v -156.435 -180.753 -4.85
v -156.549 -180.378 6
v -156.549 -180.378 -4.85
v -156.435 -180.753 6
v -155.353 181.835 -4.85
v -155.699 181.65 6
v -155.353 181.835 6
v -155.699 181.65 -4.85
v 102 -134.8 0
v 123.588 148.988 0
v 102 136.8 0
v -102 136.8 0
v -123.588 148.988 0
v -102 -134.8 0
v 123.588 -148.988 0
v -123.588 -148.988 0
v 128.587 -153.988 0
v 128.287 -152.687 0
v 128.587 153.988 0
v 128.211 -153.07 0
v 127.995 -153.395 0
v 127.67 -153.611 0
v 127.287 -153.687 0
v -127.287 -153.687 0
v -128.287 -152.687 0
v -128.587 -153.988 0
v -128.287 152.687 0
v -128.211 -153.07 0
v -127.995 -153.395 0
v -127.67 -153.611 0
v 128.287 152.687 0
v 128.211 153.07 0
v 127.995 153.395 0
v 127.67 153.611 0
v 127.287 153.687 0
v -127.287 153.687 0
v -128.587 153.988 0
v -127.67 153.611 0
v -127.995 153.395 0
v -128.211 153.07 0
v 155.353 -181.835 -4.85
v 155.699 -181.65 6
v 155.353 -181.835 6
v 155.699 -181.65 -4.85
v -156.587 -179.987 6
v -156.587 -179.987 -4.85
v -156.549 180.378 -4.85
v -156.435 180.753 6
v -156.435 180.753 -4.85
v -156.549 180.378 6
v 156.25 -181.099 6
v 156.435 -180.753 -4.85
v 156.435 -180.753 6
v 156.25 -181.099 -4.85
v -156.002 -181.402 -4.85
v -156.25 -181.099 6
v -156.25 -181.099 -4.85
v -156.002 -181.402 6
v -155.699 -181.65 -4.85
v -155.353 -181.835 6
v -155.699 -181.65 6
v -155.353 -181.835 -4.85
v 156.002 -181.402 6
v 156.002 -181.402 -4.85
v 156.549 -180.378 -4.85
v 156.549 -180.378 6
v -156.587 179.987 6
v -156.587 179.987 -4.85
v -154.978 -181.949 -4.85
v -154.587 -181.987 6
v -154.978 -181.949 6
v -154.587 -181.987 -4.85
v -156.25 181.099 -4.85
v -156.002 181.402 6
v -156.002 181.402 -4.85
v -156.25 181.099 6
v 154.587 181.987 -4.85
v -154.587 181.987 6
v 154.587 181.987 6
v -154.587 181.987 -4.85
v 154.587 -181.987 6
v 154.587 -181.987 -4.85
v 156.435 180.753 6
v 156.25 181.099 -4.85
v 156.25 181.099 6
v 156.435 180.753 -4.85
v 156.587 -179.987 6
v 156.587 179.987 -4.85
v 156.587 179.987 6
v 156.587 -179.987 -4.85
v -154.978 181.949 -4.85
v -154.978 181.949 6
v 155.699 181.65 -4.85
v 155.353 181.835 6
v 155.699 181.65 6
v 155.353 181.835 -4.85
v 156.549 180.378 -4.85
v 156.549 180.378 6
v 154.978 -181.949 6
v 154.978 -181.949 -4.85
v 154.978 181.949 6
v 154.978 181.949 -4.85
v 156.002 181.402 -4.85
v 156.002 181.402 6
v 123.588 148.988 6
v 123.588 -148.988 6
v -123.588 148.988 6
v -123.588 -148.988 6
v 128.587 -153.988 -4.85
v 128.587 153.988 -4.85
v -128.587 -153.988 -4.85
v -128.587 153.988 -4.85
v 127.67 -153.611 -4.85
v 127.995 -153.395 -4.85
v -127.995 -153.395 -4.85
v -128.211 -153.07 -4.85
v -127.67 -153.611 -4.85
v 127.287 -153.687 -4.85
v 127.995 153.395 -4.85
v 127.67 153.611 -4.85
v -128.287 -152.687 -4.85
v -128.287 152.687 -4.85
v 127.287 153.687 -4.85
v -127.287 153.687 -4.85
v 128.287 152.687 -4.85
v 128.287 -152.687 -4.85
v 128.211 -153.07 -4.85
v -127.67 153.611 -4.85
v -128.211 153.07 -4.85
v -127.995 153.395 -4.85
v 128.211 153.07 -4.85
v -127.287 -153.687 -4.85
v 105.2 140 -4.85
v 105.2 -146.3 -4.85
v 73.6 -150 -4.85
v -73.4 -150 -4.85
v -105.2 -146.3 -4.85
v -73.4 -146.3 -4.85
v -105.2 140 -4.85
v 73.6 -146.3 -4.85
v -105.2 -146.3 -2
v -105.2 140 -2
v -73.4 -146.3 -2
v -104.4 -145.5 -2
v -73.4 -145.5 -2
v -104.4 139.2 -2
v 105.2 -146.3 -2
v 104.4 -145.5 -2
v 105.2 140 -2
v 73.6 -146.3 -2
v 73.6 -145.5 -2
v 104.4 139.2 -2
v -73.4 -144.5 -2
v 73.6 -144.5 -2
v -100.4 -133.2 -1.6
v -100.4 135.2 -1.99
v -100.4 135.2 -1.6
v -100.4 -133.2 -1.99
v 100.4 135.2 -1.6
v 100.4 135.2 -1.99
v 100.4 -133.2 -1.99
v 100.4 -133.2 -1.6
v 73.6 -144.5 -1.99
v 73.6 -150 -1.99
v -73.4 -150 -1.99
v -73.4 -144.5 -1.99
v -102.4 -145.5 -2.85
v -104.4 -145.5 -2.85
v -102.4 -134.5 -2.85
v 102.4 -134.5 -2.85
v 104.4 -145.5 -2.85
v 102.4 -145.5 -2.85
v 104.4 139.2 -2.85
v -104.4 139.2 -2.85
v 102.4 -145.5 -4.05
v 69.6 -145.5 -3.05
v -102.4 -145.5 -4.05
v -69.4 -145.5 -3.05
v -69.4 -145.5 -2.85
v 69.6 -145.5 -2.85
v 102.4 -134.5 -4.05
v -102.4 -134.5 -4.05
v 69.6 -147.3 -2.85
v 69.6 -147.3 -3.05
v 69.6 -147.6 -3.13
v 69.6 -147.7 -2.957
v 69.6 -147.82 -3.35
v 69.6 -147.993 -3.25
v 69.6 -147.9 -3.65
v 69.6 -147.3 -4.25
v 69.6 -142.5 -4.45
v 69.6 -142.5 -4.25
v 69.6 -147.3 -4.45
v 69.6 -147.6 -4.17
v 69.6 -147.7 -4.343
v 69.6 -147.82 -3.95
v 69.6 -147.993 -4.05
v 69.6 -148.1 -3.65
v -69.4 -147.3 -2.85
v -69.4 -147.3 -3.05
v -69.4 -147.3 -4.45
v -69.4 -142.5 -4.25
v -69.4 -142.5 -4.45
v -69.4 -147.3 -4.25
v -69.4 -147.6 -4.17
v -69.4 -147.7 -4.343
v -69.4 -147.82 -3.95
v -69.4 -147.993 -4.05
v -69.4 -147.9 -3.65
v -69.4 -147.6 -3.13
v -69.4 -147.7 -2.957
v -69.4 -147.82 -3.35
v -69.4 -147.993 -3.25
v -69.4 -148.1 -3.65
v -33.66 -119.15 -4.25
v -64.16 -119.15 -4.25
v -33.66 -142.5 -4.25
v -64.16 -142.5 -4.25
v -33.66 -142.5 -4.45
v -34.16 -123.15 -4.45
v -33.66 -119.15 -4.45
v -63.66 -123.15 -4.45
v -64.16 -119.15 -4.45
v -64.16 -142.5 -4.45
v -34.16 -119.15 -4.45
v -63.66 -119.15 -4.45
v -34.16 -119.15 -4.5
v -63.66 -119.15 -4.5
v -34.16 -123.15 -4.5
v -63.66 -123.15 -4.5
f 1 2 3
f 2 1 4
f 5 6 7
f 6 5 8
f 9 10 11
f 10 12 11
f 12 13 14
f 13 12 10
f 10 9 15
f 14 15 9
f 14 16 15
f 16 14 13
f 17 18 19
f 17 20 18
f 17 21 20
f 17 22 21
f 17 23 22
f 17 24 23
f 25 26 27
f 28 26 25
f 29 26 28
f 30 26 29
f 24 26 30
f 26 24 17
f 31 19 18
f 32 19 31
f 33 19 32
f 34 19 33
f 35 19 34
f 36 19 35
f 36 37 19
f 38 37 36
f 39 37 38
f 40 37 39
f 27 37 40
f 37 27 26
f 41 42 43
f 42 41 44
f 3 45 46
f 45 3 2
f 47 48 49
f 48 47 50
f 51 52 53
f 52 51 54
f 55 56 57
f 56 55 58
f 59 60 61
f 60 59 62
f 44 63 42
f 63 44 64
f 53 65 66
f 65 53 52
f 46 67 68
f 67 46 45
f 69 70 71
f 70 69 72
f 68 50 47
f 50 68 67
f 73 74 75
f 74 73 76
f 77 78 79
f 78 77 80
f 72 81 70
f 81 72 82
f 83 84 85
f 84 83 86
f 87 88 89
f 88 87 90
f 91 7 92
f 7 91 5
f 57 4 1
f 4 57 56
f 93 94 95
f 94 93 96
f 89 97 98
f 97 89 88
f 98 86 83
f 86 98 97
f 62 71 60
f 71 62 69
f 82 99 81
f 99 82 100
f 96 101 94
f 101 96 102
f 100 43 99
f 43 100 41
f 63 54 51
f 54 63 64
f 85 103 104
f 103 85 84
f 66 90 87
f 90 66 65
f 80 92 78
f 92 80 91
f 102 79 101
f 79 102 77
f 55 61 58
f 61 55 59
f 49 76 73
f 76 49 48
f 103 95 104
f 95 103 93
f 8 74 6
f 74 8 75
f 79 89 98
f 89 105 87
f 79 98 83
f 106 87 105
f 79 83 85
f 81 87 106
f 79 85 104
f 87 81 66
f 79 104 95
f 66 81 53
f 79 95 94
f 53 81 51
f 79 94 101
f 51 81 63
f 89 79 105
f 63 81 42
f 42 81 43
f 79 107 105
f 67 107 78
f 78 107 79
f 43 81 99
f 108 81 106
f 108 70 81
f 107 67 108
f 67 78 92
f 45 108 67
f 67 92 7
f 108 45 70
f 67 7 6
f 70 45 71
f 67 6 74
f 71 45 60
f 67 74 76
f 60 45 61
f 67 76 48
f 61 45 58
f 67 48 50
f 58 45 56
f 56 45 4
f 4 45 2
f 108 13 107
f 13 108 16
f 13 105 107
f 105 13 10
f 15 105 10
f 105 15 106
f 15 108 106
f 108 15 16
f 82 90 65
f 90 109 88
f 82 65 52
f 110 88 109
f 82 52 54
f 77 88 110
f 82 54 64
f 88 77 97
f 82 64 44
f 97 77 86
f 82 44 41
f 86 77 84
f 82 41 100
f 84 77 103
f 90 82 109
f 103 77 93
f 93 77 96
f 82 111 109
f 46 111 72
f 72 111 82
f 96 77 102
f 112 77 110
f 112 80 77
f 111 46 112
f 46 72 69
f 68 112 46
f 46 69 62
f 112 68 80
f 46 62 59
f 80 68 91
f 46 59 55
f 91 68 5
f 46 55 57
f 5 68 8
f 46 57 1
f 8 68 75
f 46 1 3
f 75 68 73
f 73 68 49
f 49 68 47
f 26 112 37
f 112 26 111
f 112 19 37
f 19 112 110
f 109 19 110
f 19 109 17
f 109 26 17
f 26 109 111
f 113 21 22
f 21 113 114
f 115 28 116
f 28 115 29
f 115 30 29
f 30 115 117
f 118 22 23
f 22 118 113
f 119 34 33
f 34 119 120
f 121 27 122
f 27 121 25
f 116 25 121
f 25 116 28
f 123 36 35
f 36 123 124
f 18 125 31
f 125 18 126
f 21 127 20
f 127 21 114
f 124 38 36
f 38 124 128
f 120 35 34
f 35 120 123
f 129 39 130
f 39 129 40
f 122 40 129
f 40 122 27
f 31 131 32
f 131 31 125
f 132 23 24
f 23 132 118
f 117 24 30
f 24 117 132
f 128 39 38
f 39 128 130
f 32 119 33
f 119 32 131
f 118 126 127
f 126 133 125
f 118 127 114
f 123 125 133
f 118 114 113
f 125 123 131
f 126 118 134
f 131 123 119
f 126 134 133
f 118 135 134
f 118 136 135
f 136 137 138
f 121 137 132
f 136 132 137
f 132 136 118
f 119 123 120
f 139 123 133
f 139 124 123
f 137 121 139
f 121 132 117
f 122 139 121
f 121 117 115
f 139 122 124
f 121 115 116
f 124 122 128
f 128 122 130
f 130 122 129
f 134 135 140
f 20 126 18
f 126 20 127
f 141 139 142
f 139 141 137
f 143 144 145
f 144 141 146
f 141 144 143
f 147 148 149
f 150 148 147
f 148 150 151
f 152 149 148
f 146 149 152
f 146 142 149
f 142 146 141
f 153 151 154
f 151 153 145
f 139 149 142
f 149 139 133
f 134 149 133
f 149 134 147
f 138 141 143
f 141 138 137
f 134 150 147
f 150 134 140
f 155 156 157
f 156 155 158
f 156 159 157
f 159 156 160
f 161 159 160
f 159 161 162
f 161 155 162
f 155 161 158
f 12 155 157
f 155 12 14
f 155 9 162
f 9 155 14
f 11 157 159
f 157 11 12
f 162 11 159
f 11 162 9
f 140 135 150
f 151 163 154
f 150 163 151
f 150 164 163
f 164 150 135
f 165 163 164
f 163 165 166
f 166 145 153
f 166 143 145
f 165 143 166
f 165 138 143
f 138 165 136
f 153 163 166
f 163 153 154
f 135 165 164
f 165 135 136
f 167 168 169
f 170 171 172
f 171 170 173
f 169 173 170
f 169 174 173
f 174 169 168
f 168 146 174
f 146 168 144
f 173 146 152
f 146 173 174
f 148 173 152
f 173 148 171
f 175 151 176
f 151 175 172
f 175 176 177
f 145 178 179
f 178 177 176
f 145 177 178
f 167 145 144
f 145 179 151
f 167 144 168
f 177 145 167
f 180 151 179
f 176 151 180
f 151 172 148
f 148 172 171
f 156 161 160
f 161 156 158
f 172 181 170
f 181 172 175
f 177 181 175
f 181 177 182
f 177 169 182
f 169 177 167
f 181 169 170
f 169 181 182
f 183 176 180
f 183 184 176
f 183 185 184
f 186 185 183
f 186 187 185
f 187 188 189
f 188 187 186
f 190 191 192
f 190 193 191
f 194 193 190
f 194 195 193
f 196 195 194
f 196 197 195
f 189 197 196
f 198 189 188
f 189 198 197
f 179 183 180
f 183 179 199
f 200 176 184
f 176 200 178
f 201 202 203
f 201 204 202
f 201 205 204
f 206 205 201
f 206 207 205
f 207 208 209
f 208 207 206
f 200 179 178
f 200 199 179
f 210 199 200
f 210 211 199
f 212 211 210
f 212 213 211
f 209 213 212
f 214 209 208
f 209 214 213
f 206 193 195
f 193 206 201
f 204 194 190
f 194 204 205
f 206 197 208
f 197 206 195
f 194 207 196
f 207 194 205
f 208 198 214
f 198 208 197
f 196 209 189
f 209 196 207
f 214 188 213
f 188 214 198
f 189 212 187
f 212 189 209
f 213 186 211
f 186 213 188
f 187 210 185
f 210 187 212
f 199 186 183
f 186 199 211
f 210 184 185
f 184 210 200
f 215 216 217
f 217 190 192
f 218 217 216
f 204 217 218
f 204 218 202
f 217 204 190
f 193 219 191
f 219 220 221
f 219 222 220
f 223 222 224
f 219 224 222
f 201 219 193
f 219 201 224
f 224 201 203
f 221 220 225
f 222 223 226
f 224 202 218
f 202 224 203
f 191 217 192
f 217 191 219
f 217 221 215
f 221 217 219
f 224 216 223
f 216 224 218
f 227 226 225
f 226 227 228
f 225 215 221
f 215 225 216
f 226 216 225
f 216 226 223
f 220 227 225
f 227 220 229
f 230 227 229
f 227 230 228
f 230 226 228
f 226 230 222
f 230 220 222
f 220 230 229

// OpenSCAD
// =====================================================================
// Picture-frame bezel spacer — Waveshare 13.3" Spectra 6 (E6) panel in a
// 12 1/16" x 10 1/16" rabbet, hung portrait, no glazing.
//
// What it is
// ----------
// A stepped ring that drops into the frame's rabbet in front of the panel:
//
//   front  ┌──────────────┐   face plate: the visible bezel, 45° mat-style
//          │  ┌────────┐  │   bevel on the window edge; overlaps the glass
//   wall ──┤  │ window │  │   so the panel cannot come forward.
//          │  └────────┘  │
//   back   └──────────────┘   pocket wall: fills the gap between the glass
//                              and the rabbet, so the panel cannot slide.
//
// The frame's own lip presses on the face plate; the frame's backing board
// presses everything forward. Nothing grabs the glass: every step of the
// load path is a push. See docs/plans/frame-bezel.md.
//
// The FPC leaves one SHORT edge of the glass (the 208.8 mm edge) in the
// plane of the glass, from its back surface, and must fold 180° behind the
// panel within ~3.4 mm of the glass edge (vendor drawing: "bending area
// R>0.5"). On that edge the pocket wall is simply absent from the back of the
// face plate through to the back of the spacer, outward past the glass by
// fpc_notch_out, over the whole width of the bonded flex.
//
// The rabbet depth was measured with printed coupons (part = "coupons"):
// 4.85 mm from the back of the lip to where the backing board sits. That is
// face + glass + 2.0 mm, and the 2.0 mm behind the glass is where the
// ribbon folds (R > 0.5 needs ~1.4) and where the 1.2 mm fan-out bump sits,
// so both live inside the spacer's depth. The backing board only needs a
// hole where the tail and the driver board are.
//
// Numbers come from the vendor drawing in the 13.3inch e-Paper (E) user
// manual, section 4:  OD 208.80 x 284.70 x 0.85, AA 202.80 x 270.40,
// AA is 3.00 from the glass on three edges and 11.30 on the FPC edge;
// the 60-pin tail is 30.5 wide, 29.75 long, its near edge 40.24 from the
// glass corner; the bonded flex runs ~40 to ~176 mm along that edge; the
// fan-out area on the back near that edge stands up to 1.2 mm proud.
//
//   part = "assembly"   frame + spacer + panel + FPC, viewed from the front
//        | "back"       spacer + panel + FPC only, meant to be viewed from behind
//        | "exploded"   frame, spacer, panel pulled apart along Z
//        | "section"    assembly cut through the FPC tail, half kept
//        | "profile"    a 1 mm slice through the tail, incl. backing board: the true section
//        | "calib"      a 200 mm square, for calibrating an orthographic render
//        | "ring"       the spacer alone, one piece, as installed
//        | "pieces"     the split spacer, face-down, laid out for printing
//        | "piece"      one piece (piece_id), face-down, for STL export
//        | "coupons"    test plate: corner samples at coupon_thicks, a joint pair, a notch slice
//        | "joint"      the dovetail pair alone, well separated, for a fit test
//        | "joints"     fit ladder: one tab half and a socket half per value in joint_fits
//        | "notch"      the ribbon-edge piece from behind with the glass ghosted: the notch area
//
// Frame coordinates: origin at the rabbet centre, X across, Y up, viewer
// at +Z. The spacer's front face is z = 0 and it extends to z = -thick.
// Print parts are mirrored so the front face lies on the bed.
// =====================================================================

/* [What to render] */
part     = "assembly";   // assembly | back | section | ring | pieces | piece
piece_id = 0;            // for part="piece": 0 top-left, 1 top-right, 2 bottom-left, 3 bottom-right (halves: 0 top, 1 bottom)

/* [Frame rabbet — measured, as hung] */
rabbet_w_in = 10.125;    // width of the rabbet opening, inches (first print at 10 1/16 sat 1/16 loose)
rabbet_h_in = 12.125;    // height, inches (same)
rabbet_fit  = 0.6;       // total clearance to the rabbet (0.3 per side)
rabbet_depth_in = 4.85 / 25.4;  // back of the lip to where the backing board sits: measured with coupons, 4.85 mm
outer_r     = 1.0;       // outer corner radius (routed rabbets are rarely dead sharp)
frame_lip   = 5.0;       // mock-up only: how far the moulding overhangs the rabbet
frame_face  = 28;        // mock-up only: moulding width

/* [Panel — vendor drawing] */
panel_w    = 208.8;      // glass, short axis
panel_h    = 284.7;      // glass, long axis (FPC on one end of this axis)
panel_t    = 0.85;
aa_w       = 202.8;
aa_h       = 270.4;
aa_off     = 3.0;        // glass edge to active area, three edges
aa_off_fpc = 11.3;       // glass edge to active area, FPC edge
panel_fit  = 1.6;        // total pocket clearance around the glass (0.8 a side; was 0.6 until the -0.05 joints closed the ring up)
bump_t     = 1.2;        // fan-out area stands this far off the BACK of the glass
bump_w     = 11.0;       // ... over this strip along the FPC edge (mock-up)
fpc_fold_t = 1.8;        // the folded flex stands this far off the back of the glass (mock-up)

/* [FPC — vendor drawing] */
fpc_side       = "bottom";  // bottom | top | left | right : which frame edge the ribbon edge of the glass sits on
fpc_mirror     = false;     // set true if the tail is nearest the OTHER corner of that edge than the mock-up shows
fpc_bond_from  = 35.0;      // bonded flex, along the FPC edge, from the tail-side glass corner (first print: flex flush at 40, so 5 mm more)
fpc_bond_to    = 174.0;     // (first print had ~5 mm spare here)
fpc_tail_from  = 40.24;     // tail near edge from the same corner
fpc_tail_w     = 30.5;
fpc_tail_len   = 29.75;     // beyond the glass edge before folding, i.e. behind the panel after
fpc_notch_out  = 4.5;       // notch reaches this far past the glass edge (bend zone is ~3.4)
fpc_notch_ext  = 4.0;       // notch runs this much past the bonded flex at each end
// The notch is the full wall: from the pocket floor (back of the face plate)
// through to the back of the spacer. The first print stopped it 0.25 mm short
// of the glass back and left a 0.6 mm sliver of wall standing between the
// pocket and the recess, which served nothing.

/* [Bezel] */
face_t         = 2.0;    // visible face plate thickness
image_hidden   = 1.0;    // image lost under the lip, per edge (lip = dead border + this)
bevel          = 1.6;    // 45° bevel on the window edge, measured into the face (< face_t)
pocket_clear_z = 0.3;    // depth float for the glass behind the face plate
back_t         = 1.7;    // body behind that: fills the rabbet to 4.85 and gives the fold its room

/* [Panel placement] */
centre_on      = "active";  // active | glass : what sits centred in the rabbet
centre_bias    = 1.0;       // mm to move the glass back toward the rabbet centre from the "active" position (buys FPC-side wall)

/* [Split for printing] */
split          = "quarters";  // none | halves | quarters
joint_top_x    = 0;      // joint position along the top edge (frame X)
joint_bottom_x = -88;    // along the bottom edge — kept clear of the FPC notch
joint_side_y   = 0;      // joint position on the left and right edges (frame Y); halves split here too
tab_depth      = 8;
tab_neck       = 7;
tab_head       = 10;
// Fit values below were dialled in by test print on one printer in PETG.
// Another material or printer will land elsewhere: PLA shrinks less, so
// -0.05 may be tight; ABS/ASA shrink more, so it may be loose. Print
// part = "joints" first and set tab_fit to the socket that seats with light
// friction. The same goes for rabbet_fit and panel_fit, less critically.
tab_fit        = -0.05;  // PETG, this printer: 0.15 and 0.05 loose, -0.05 right
plate_gap      = 8;      // spacing between pieces in the print layout

/* [Sample coupons] */
coupon_thicks  = [4.85, 4.95, 5.05, 5.15, 5.25, 5.35];  // total thickness ladder (first set 2.9..3.35 left 1.6 mm short of the rabbet floor at 3.35)
coupon_size    = 40;                       // corner coupon edge length
coupon_gap     = 8;
coupon_cols    = 3;                        // corners per row on the plate
coupon_extras  = true;                     // also print the joint pair and the notch slice
joint_fits     = [0.10, 0.05, 0.0, -0.05]; // socket clearance ladder for part = "joints" (0.15 was loose in PETG)

/* [Mock-up] */
show_backing   = true;   // in the profile: the frame's backing board with its ribbon-edge cut-out
backing_t      = 3.0;
backing_relief = 40;     // hole in the backing board for the tail and driver board reaches this far up from the glass edge
aa_key         = false;  // paint the active area magenta so a real screen image can be keyed in
explode        = 60;     // z separation in the exploded view
spacer_color   = [0.22, 0.23, 0.25];
frame_color    = [0.33, 0.22, 0.14];

/* [Rendering] */
$fa = 2;
$fs = 0.4;
eps = 0.01;

// ---------------------------------------------------------------------
// Derived — internal coordinates put the FPC edge at -Y; the whole model
// is rotated at the end for left/right/top.
// ---------------------------------------------------------------------
in = 25.4;
vertical_fpc = (fpc_side == "bottom" || fpc_side == "top");
Wr = (vertical_fpc ? rabbet_w_in : rabbet_h_in) * in;   // internal X
Hr = (vertical_fpc ? rabbet_h_in : rabbet_w_in) * in;   // internal Y
Wout = Wr - rabbet_fit;
Hout = Hr - rabbet_fit;

pocket_w = panel_w + panel_fit;
pocket_h = panel_h + panel_fit;
aa_shift = (aa_off_fpc - aa_off) / 2;                    // AA centre is this far from glass centre, away from the FPC
glass_cy = (centre_on == "active") ? -(aa_shift - centre_bias) : 0;
aa_cy    = glass_cy + aa_shift;

win_w = aa_w - 2 * image_hidden;                         // opening at the back of the face plate
win_h = aa_h - 2 * image_hidden;
thick = face_t + panel_t + pocket_clear_z + back_t;
pocket_d = thick - face_t;
rabbet_depth = rabbet_depth_in * in;

glass_bot = glass_cy - panel_h / 2;
glass_top = glass_cy + panel_h / 2;
gap_bot   = Hout / 2 + glass_bot;                        // wall thickness below the glass (before the notch)
gap_top   = Hout / 2 - glass_top;
gap_side  = (Wout - panel_w) / 2;

lip_side = (panel_w - win_w) / 2;                        // face plate overlap onto the glass
lip_top  = glass_top - (aa_cy + win_h / 2);
lip_bot  = (aa_cy - win_h / 2) - glass_bot;

// Along-edge coordinate u (vendor drawing, from the tail-side corner) -> internal X
function ux(u) = fpc_mirror ? (panel_w / 2 - u) : (-panel_w / 2 + u);
notch_x0 = min(ux(fpc_bond_from - fpc_notch_ext), ux(fpc_bond_to + fpc_notch_ext));
notch_x1 = max(ux(fpc_bond_from - fpc_notch_ext), ux(fpc_bond_to + fpc_notch_ext));
tail_x0  = min(ux(fpc_tail_from), ux(fpc_tail_from + fpc_tail_w));
tail_x1  = max(ux(fpc_tail_from), ux(fpc_tail_from + fpc_tail_w));
tail_cx  = (tail_x0 + tail_x1) / 2;
z_panel_front = -face_t;
z_panel_back  = -face_t - panel_t;

final_rot = (fpc_side == "bottom") ? 0 : (fpc_side == "top") ? 180 : (fpc_side == "right") ? 90 : -90;

echo(str("rabbet ", Wr, " x ", Hr, " mm; spacer outer ", Wout, " x ", Hout, " x ", thick));
echo(str("window (back) ", win_w, " x ", win_h, "; front opening ", win_w + 2*bevel, " x ", win_h + 2*bevel));
echo(str("lip over glass: sides ", lip_side, " top ", lip_top, " fpc ", lip_bot));
echo(str("wall: sides ", gap_side - panel_fit/2, " top ", gap_top - panel_fit/2, " fpc ", gap_bot - panel_fit/2, " (", gap_bot - fpc_notch_out, " left outside the notch)"));
echo(str("visible bezel with ", frame_lip, " mm lip: sides ", gap_side + lip_side - frame_lip + rabbet_fit/2, " top ", gap_top + lip_top - frame_lip + rabbet_fit/2, " fpc ", gap_bot + lip_bot - frame_lip + rabbet_fit/2));
echo(str("notch x ", notch_x0, " .. ", notch_x1, "; tail x ", tail_x0, " .. ", tail_x1));
if (thick > rabbet_depth + 0.05)
  echo(str("WARNING: spacer is ", thick, " thick but the rabbet is only ", rabbet_depth, " deep"));

// ---------------------------------------------------------------------
// Primitives
// ---------------------------------------------------------------------
module rrect(w, h, r) {
  if (r <= 0) square([w, h], center = true);
  else hull() for (sx = [-1, 1], sy = [-1, 1])
    translate([sx * (w/2 - r), sy * (h/2 - r)]) circle(r = r);
}
module box(x0, x1, y0, y1, z0, z1) {
  translate([min(x0,x1), min(y0,y1), min(z0,z1)])
    cube([abs(x1-x0), abs(y1-y0), abs(z1-z0)]);
}

// ---------------------------------------------------------------------
// The spacer ring, internal coordinates, as installed (front face z=0)
// ---------------------------------------------------------------------
module fpc_notch(ft = face_t, th = thick) {
  // inner end reaches 1 mm INTO the pocket so the two cuts merge; the first
  // print had this sign wrong and left a 1 mm wall between pocket and notch
  box(notch_x0, notch_x1,
      glass_bot + 1, glass_bot - fpc_notch_out,
      -th - 1, -ft + eps);
}

// ft = face plate thickness, th = total; defaults are the real part
module ring(ft = face_t, th = thick) {
  bv = min(bevel, ft - 0.4);
  difference() {
    translate([0, 0, -th]) linear_extrude(th) rrect(Wout, Hout, outer_r);
    // panel pocket, open to the back
    translate([0, glass_cy, -th - 1])
      linear_extrude(th - ft + 1) square([pocket_w, pocket_h], center = true);
    // window
    translate([0, aa_cy, -ft - 1])
      linear_extrude(ft + 2) square([win_w, win_h], center = true);
    // mat-style bevel: wider at the front face
    hull() {
      translate([0, aa_cy, -bv]) linear_extrude(eps) square([win_w, win_h], center = true);
      translate([0, aa_cy, 0]) linear_extrude(1) square([win_w + 2*bv, win_h + 2*bv], center = true);
    }
    fpc_notch(ft, th);
  }
}

// ---------------------------------------------------------------------
// Coupons: small samples to try in the real frame before printing 300 mm
// of PETG. Corner coupons drop into the top-left rabbet corner; put the
// backing board on and feel which thickness the turn buttons close on.
// ---------------------------------------------------------------------
function coupon_face(th) = min(face_t, th - panel_t - pocket_clear_z);

module corner_coupon(th) {
  ft = coupon_face(th);
  mirror([0, 0, 1]) intersection() {
    ring(ft, th);
    box(-BIG, -Wout/2 + coupon_size, Hout/2 - coupon_size, BIG, -BIG, BIG);
  }
  // thickness embossed on the back (up, when printed face-down), on the side wall
  translate([-Wout/2 + gap_side/2 + 1, Hout/2 - coupon_size + 4, th - eps])
    linear_extrude(0.4) rotate(90) text(str(th), size = 5, halign = "left", valign = "center");
}

module joint_coupon(sep = coupon_gap) {
  for (i = [0, 1])
    translate([i == 0 ? -sep/2 : sep/2, 0, 0])
      mirror([0, 0, 1]) intersection() {
        spacer_piece(i);
        box(joint_top_x - 26, joint_top_x + 26, Hout/2 - 30, BIG, -BIG, BIG);
      }
}

// fit ladder: the tab half of the top joint once, and the socket half at each
// clearance in joint_fits, labelled on the back. Try the one tab in every socket.
module tab_half() {
  mirror([0, 0, 1]) intersection() {
    spacer_piece(0);
    box(joint_top_x - 26, joint_top_x + 12, Hout/2 - 30, BIG, -BIG, BIG);
  }
}
module socket_half(fit) {
  mirror([0, 0, 1]) intersection() {
    spacer_piece(1, fit);
    box(joint_top_x, joint_top_x + 26, Hout/2 - 30, BIG, -BIG, BIG);
  }
  translate([joint_top_x + 14, Hout/2 - 8, thick - eps])
    linear_extrude(0.4) text(str(fit), size = 4, halign = "left", valign = "center");
}

module notch_coupon() {
  mirror([0, 0, 1]) intersection() {
    ring();
    box(tail_cx - 25, tail_cx + 25, -BIG, glass_bot + 22, -BIG, BIG);
  }
}

// ---------------------------------------------------------------------
// Splitting. A joint is a dovetail on one piece, the matching socket on
// its neighbour. Tabs live on the leg's material, centred on the wall
// where the wall is wide enough, otherwise on the face plate.
// ---------------------------------------------------------------------
BIG = 1000;

// dovetail pointing +X from x=0, centred on y=0
module dovetail2d(grow = 0) {
  polygon([[-2*grow - (grow > 0 ? 1 : 0), -tab_neck/2 - grow],
           [tab_depth + grow,              -tab_head/2 - grow],
           [tab_depth + grow,               tab_head/2 + grow],
           [-2*grow - (grow > 0 ? 1 : 0),   tab_neck/2 + grow]]);
}

// leg centrelines for the tabs
function leg_centre_top()    = (gap_top - panel_fit/2 >= tab_head + 3)
                                 ? (glass_top + panel_fit/2 + Hout/2) / 2
                                 : (aa_cy + win_h/2 + Hout/2) / 2;
function leg_centre_bottom() = (gap_bot - panel_fit/2 >= tab_head + 3)
                                 ? (glass_bot - panel_fit/2 - Hout/2) / 2
                                 : (aa_cy - win_h/2 - Hout/2) / 2;
function leg_centre_side()   = (pocket_w/2 + Wout/2) / 2;

// joint = [x, y, direction(deg)]: tab points along direction from (x,y)
top_joint    = [joint_top_x,    leg_centre_top(),     0];    // tab from the left piece, points +X
bottom_joint = [joint_bottom_x, leg_centre_bottom(),  0];
left_joint   = [-leg_centre_side(), joint_side_y,    90];    // tab from the bottom piece, points +Y
right_joint  = [ leg_centre_side(), joint_side_y,    90];

module tab3d(j, grow = 0) {
  translate([j[0], j[1], -thick - 1]) linear_extrude(thick + 2)
    rotate(j[2]) dovetail2d(grow);
}

// piece = ring ∩ region, plus its tabs, minus the sockets its neighbours' tabs need
module piece(region_pts, tabs, sockets, fit = tab_fit) {
  difference() {
    intersection() {
      ring();
      union() {
        translate([0, 0, -thick - 1]) linear_extrude(thick + 2) polygon(region_pts);
        for (j = tabs) tab3d(j);
      }
    }
    for (j = sockets) tab3d(j, fit);
  }
}

function rect_pts(x0, x1, y0, y1) = [[x0,y0],[x1,y0],[x1,y1],[x0,y1]];

// region polygons: the split lines are x=joint_top_x above y=joint_side_y,
// x=joint_bottom_x below it, and y=joint_side_y on the sides.
function region(i) =
  split == "quarters" ? (
    i == 0 ? rect_pts(-BIG, joint_top_x,    joint_side_y,  BIG) :
    i == 1 ? rect_pts(joint_top_x,  BIG,    joint_side_y,  BIG) :
    i == 2 ? rect_pts(-BIG, joint_bottom_x, -BIG, joint_side_y) :
             rect_pts(joint_bottom_x, BIG,  -BIG, joint_side_y)) :
  split == "halves" ? (
    i == 0 ? rect_pts(-BIG, BIG, joint_side_y, BIG) :
             rect_pts(-BIG, BIG, -BIG, joint_side_y)) :
  rect_pts(-BIG, BIG, -BIG, BIG);

function tabs(i) =
  split == "quarters" ? (
    i == 0 ? [top_joint] : i == 1 ? [] : i == 2 ? [bottom_joint, left_joint] : [right_joint]) :
  split == "halves" ? (i == 0 ? [] : [left_joint, right_joint]) : [];

function sockets(i) =
  split == "quarters" ? (
    i == 0 ? [left_joint] : i == 1 ? [top_joint, right_joint] : i == 2 ? [] : [bottom_joint]) :
  split == "halves" ? (i == 0 ? [left_joint, right_joint] : []) : [];

n_pieces = split == "quarters" ? 4 : split == "halves" ? 2 : 1;

module spacer_piece(i, fit = tab_fit) { piece(region(i), tabs(i), sockets(i), fit); }

// face-down for printing: front face on z=0, body in +Z
module printable(i) { mirror([0, 0, 1]) spacer_piece(i); }

// spread the pieces apart so they read as separate parts
function spread(i) =
  split == "quarters" ? [ (i % 2 == 0 ? -1 : 1) * plate_gap/2, (i < 2 ? 1 : -1) * plate_gap/2 ] :
  split == "halves"   ? [ 0, (i == 0 ? 1 : -1) * plate_gap/2 ] : [0, 0];

// ---------------------------------------------------------------------
// Mock-up geometry. clip() cuts the section views; it sits inside the
// color() calls because preview drops colours set inside an intersection.
// ---------------------------------------------------------------------
clip_x0 = (part == "profile") ? tail_cx - 0.5 : (part == "section") ? tail_cx : -BIG;
clip_x1 = (part == "profile") ? tail_cx + 0.5 : BIG;
// profile: a true 2D section on the plane x = tail_cx, laid out with the
// frame's front at the top and the frame edge on the left (2D keeps colours)
module clip() {
  if (part == "profile")
    linear_extrude(1) rotate(-90) projection(cut = true)
      rotate([0, -90, 0]) translate([-tail_cx, 0, 0]) children();
  else if (part == "section")
    intersection() { children(); box(clip_x0, clip_x1, -BIG, BIG, -BIG, BIG); }
  else children();
}
module panel_mock() {
  // glass
  color([0.82, 0.84, 0.86, 1]) clip()
    translate([0, glass_cy, z_panel_back]) linear_extrude(panel_t)
      square([panel_w, panel_h], center = true);
  // active area, a hair proud so it renders on top (magenta when keying a real image in)
  color(aa_key ? [1, 0, 1] : [0.97, 0.97, 0.95]) clip()
    translate([0, aa_cy, z_panel_front - 0.02]) linear_extrude(0.03)
      square([aa_w, aa_h], center = true);
  // fan-out strip on the back, FPC edge
  color([0.10, 0.30, 0.16]) clip()
    box(-panel_w/2 + 2, panel_w/2 - 2, glass_bot, glass_bot + bump_w, z_panel_back, z_panel_back - bump_t);
}

module fpc_mock() {
  t = 0.2;
  r = (fpc_fold_t - t) / 2;                    // fold radius (vendor: R > 0.5, bend zone ends ~3.4 past the glass)
  f0 = 1.8;                                    // flat run past the glass before the bend starts
  bond_x0 = min(ux(fpc_bond_from), ux(fpc_bond_to));
  bond_x1 = max(ux(fpc_bond_from), ux(fpc_bond_to));
  color([0.85, 0.55, 0.15]) clip() {
    // bonded flex on the back of the glass, running out past the edge to the fold
    box(bond_x0, bond_x1, glass_bot + 6, glass_bot - f0, z_panel_back, z_panel_back - t);
    // the fold: half a tube, bulging outward (-Y)
    translate([bond_x0, glass_bot - f0, z_panel_back - r])
      rotate([0, 90, 0]) mirror([0, 1, 0])
        rotate_extrude(angle = 180) translate([r - t, 0]) square([t, bond_x1 - bond_x0]);
    // back behind the panel: full width for a few mm, then the tail
    box(bond_x0, bond_x1, glass_bot - f0, glass_bot + 3, z_panel_back - 2*r, z_panel_back - 2*r + t);
    box(tail_x0, tail_x1, glass_bot - f0, glass_bot + fpc_tail_len - 3.4, z_panel_back - 2*r, z_panel_back - 2*r + t);
    // 60-pin fingers
    color([0.9, 0.75, 0.2]) clip()
      box(tail_cx - 14.75, tail_cx + 14.75, glass_bot + fpc_tail_len - 7.4, glass_bot + fpc_tail_len - 3.4,
          z_panel_back - 2*r, z_panel_back - 2*r - 0.05);
  }
}

module frame_mock() {
  sight_w = Wr - 2 * frame_lip;
  sight_h = Hr - 2 * frame_lip;
  color(frame_color) clip() {
    // lip
    difference() {
      linear_extrude(6) rrect(Wr + 2*frame_face, Hr + 2*frame_face, 2);
      translate([0, 0, -1]) linear_extrude(8) square([sight_w, sight_h], center = true);
    }
    // rabbet walls
    difference() {
      translate([0, 0, -rabbet_depth]) linear_extrude(rabbet_depth) rrect(Wr + 2*frame_face, Hr + 2*frame_face, 2);
      translate([0, 0, -rabbet_depth - 1]) linear_extrude(rabbet_depth + 2) square([Wr, Hr], center = true);
    }
  }
}

module backing_mock() {
  zb = -thick;                                  // backing board sits on the spacer's back face
  color([0.55, 0.45, 0.35, 0.55]) clip()
    difference() {
      translate([0, 0, zb - backing_t]) linear_extrude(backing_t) square([Wr - 1, Hr - 1], center = true);
      // hole for the tail and the driver board (the fold itself is inside the spacer's depth)
      box(tail_x0 - 6, tail_x1 + 6, glass_bot - 2, glass_bot + backing_relief, zb + 1, zb - backing_t - 1);
    }
}

module spacer_colored() { color(spacer_color) clip() for (i = [0 : n_pieces - 1]) spacer_piece(i); }

module assembly(with_frame = true, with_backing = false) {
  if (with_frame) frame_mock();
  spacer_colored();
  panel_mock();
  fpc_mock();
  if (with_backing && show_backing) backing_mock();
}

// ---------------------------------------------------------------------
// Dispatch
// ---------------------------------------------------------------------
rotate(final_rot) {
  if (part == "assembly") assembly();
  else if (part == "back") assembly(false, false);
  else if (part == "exploded") {
    translate([0, 0, explode]) frame_mock();
    spacer_colored();
    translate([0, 0, -explode]) { panel_mock(); fpc_mock(); }
  }
  else if (part == "section" || part == "profile") assembly(true, true);   // clip() does the cutting
  else if (part == "calib") color([0, 0, 0]) linear_extrude(1) square(200, center = true);
  else if (part == "ring") color(spacer_color) ring();
  else if (part == "pieces")
    for (i = [0 : n_pieces - 1]) color(i % 2 == 0 ? spacer_color : spacer_color + [0.2, 0.2, 0.2])
      translate(spread(i)) printable(i);
  else if (part == "piece") color(spacer_color) printable(piece_id);
  else if (part == "notch") {
    color(spacer_color) for (i = [0 : n_pieces - 1]) spacer_piece(i);
    color([0.75, 0.80, 0.85, 0.45])
      translate([0, glass_cy, z_panel_back]) linear_extrude(panel_t) square([panel_w, panel_h], center = true);
    fpc_mock();
  }
  else if (part == "joint") color(spacer_color) translate([0, -Hout/2, 0]) joint_coupon(30);
  else if (part == "joints") color(spacer_color) {
    translate([-(joint_top_x - 26), -(Hout/2 - 30), 0]) tab_half();
    for (i = [0 : len(joint_fits) - 1])
      translate([50 - joint_top_x, -(Hout/2 - 30) + i * 34, 0]) socket_half(joint_fits[i]);
  }
  else if (part == "coupons") color(spacer_color) {
    // corner coupons in rows of coupon_cols, thinnest first; then the joint pair and the notch slice
    rows = ceil(len(coupon_thicks) / coupon_cols);
    pitch = coupon_size + coupon_gap;
    for (i = [0 : len(coupon_thicks) - 1])
      translate([Wout/2 + (i % coupon_cols) * pitch, -Hout/2 + floor(i / coupon_cols) * pitch, 0])
        corner_coupon(coupon_thicks[i]);
    if (coupon_extras) {
      translate([30, -Hout/2 - 30 - coupon_gap, 0]) joint_coupon();
      translate([-tail_cx - 25 + 76 + coupon_gap, -glass_bot - 22 - 30 - coupon_gap, 0]) notch_coupon();
    }
  }
}
